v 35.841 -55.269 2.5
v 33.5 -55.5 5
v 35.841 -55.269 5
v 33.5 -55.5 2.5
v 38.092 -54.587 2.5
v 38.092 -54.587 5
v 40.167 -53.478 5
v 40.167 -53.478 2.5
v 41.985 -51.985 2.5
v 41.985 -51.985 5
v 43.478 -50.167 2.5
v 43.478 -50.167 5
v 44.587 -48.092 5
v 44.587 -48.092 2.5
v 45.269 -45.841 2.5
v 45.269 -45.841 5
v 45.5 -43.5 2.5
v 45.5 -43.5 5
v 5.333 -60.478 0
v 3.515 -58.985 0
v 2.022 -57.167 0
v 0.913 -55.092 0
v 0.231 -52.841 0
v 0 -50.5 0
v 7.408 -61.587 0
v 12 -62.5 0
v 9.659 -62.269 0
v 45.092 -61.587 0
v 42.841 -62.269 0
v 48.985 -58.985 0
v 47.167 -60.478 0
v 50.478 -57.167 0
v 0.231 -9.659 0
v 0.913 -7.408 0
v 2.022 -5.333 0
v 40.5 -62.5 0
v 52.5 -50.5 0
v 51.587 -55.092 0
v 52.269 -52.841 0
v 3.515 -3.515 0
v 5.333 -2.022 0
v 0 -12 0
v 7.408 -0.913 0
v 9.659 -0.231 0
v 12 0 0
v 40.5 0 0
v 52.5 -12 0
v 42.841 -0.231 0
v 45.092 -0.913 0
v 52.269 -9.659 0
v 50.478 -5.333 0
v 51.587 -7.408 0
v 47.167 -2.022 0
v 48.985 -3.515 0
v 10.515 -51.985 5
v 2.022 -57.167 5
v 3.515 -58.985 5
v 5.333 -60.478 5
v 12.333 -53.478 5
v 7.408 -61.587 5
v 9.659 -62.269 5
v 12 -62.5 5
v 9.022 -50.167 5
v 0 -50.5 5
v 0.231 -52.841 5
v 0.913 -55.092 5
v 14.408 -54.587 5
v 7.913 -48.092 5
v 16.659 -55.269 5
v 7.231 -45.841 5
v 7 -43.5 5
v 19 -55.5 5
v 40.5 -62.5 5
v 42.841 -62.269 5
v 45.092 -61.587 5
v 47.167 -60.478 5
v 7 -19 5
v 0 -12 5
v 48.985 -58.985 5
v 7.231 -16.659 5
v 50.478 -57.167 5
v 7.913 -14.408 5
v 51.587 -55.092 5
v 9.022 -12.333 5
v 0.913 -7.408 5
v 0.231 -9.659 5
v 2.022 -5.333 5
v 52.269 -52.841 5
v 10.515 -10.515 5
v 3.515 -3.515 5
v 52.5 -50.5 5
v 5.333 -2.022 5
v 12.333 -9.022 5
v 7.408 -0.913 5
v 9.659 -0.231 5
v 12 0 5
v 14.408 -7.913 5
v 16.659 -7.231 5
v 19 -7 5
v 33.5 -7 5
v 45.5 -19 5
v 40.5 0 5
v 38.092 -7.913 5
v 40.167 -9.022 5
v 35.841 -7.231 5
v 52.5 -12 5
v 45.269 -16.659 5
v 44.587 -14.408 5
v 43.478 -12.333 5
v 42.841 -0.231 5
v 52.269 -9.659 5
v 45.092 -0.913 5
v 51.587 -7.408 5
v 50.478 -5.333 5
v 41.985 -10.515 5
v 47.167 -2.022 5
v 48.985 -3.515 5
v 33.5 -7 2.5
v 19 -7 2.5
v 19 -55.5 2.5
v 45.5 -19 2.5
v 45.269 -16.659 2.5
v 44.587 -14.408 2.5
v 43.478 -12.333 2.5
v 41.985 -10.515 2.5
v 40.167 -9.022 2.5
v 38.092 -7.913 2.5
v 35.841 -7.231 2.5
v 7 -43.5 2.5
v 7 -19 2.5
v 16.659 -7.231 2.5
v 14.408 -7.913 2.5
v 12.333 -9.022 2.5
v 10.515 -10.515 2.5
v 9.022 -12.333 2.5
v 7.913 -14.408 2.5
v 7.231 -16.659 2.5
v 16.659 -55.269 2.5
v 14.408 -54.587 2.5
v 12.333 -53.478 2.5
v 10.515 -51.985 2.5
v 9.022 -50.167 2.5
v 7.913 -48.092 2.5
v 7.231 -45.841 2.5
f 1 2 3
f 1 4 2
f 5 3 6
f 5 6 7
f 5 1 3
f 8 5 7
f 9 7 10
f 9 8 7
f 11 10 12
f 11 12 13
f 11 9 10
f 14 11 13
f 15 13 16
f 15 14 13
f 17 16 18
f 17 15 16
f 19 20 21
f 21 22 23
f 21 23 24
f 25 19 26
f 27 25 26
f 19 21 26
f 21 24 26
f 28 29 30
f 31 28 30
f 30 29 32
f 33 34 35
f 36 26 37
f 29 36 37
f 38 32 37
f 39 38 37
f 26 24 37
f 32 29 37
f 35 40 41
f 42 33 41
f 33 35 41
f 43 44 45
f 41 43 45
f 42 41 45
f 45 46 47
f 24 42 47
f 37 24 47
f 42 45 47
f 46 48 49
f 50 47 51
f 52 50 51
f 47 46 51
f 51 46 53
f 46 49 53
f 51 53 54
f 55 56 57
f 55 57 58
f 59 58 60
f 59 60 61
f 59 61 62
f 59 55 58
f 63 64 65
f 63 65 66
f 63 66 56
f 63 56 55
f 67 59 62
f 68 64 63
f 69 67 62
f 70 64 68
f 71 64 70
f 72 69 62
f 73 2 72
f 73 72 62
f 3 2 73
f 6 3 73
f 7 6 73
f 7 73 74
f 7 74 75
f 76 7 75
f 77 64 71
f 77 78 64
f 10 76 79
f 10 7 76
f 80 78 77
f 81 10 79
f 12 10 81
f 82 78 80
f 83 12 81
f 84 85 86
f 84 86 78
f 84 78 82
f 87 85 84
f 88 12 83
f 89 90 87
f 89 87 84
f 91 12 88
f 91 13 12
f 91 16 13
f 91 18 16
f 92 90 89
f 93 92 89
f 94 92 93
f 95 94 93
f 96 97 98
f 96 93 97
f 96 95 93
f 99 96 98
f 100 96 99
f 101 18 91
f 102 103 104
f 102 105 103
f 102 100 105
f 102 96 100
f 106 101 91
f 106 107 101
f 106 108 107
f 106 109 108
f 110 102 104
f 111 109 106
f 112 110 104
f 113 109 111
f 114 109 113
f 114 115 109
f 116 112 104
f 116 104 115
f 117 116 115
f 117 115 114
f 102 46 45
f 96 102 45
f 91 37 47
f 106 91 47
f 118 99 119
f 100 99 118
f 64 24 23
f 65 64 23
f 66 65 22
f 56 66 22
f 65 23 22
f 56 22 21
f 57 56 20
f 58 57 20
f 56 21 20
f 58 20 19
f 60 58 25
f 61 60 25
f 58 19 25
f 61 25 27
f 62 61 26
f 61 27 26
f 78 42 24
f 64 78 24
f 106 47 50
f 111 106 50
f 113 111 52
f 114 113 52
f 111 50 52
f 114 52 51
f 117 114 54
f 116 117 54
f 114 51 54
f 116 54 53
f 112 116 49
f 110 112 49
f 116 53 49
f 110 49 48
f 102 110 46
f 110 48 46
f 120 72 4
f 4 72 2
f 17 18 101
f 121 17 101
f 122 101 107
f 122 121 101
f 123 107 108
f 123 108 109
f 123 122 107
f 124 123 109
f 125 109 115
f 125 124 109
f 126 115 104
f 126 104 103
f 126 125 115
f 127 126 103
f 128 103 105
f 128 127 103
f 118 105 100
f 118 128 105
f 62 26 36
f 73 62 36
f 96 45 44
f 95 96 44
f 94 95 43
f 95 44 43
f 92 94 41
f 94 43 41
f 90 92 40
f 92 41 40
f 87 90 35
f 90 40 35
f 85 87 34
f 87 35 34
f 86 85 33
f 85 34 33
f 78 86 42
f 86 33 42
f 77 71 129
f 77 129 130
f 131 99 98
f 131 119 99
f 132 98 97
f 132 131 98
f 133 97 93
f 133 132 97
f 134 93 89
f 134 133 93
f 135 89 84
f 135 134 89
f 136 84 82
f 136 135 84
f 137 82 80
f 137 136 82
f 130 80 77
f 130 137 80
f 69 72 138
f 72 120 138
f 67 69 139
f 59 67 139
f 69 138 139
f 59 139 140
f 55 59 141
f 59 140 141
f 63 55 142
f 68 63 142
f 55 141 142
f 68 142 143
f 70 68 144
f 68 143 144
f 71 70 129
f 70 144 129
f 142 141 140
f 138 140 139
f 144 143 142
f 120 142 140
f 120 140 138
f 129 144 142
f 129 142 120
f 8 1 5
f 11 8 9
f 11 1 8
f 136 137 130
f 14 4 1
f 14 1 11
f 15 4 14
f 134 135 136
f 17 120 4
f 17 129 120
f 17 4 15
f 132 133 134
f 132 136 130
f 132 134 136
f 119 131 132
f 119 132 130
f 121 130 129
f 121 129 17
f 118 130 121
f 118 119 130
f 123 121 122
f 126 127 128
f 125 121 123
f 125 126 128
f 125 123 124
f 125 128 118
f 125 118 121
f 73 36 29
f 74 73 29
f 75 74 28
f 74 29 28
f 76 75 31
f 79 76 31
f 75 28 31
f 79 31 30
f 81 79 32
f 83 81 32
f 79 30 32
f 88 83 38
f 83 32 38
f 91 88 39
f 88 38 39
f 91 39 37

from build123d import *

# Parameters (mm, degrees)
F1_DEPTH = 5
F2_W     = 38.5
F2_H     = 48.5
F3_DEPTH = 2.5
F4_R     = 12


with BuildPart() as f1:
    # F0 (on Top) → F1 (new body)
    with BuildSketch(Plane.XY):
        with BuildLine():
            Line((40.5, 0), (12, 0))
            ThreePointArc((12, 0), (3.514719, -3.514719), (0, -12))
            Line((0, -12), (0, -50.5))
            ThreePointArc((0, -50.5), (3.514719, -58.985281), (12, -62.5))
            Line((12, -62.5), (40.5, -62.5))
            ThreePointArc((40.5, -62.5), (48.985281, -58.985281), (52.5, -50.5))
            Line((52.5, -50.5), (52.5, -12))
            ThreePointArc((52.5, -12), (48.985281, -3.514719), (40.5, 0))
        make_face()
    extrude(amount=F1_DEPTH)

    # F2 (on face) → F3 (cut)
    with BuildSketch(Plane.XY.offset(5)):
        with Locations((26.25, -31.25)):
            Rectangle(F2_W, F2_H)
    extrude(amount=-F3_DEPTH, mode=Mode.SUBTRACT)

    # F4
    f4_edges = [f1.edges().sort_by_distance(p)[0] for p in [
        (7, -7, 3.75),
        (45.5, -7, 3.75),
        (7, -55.5, 3.75),
        (45.5, -55.5, 3.75),
    ]]
    fillet(f4_edges, radius=F4_R)


solid = f1.part
